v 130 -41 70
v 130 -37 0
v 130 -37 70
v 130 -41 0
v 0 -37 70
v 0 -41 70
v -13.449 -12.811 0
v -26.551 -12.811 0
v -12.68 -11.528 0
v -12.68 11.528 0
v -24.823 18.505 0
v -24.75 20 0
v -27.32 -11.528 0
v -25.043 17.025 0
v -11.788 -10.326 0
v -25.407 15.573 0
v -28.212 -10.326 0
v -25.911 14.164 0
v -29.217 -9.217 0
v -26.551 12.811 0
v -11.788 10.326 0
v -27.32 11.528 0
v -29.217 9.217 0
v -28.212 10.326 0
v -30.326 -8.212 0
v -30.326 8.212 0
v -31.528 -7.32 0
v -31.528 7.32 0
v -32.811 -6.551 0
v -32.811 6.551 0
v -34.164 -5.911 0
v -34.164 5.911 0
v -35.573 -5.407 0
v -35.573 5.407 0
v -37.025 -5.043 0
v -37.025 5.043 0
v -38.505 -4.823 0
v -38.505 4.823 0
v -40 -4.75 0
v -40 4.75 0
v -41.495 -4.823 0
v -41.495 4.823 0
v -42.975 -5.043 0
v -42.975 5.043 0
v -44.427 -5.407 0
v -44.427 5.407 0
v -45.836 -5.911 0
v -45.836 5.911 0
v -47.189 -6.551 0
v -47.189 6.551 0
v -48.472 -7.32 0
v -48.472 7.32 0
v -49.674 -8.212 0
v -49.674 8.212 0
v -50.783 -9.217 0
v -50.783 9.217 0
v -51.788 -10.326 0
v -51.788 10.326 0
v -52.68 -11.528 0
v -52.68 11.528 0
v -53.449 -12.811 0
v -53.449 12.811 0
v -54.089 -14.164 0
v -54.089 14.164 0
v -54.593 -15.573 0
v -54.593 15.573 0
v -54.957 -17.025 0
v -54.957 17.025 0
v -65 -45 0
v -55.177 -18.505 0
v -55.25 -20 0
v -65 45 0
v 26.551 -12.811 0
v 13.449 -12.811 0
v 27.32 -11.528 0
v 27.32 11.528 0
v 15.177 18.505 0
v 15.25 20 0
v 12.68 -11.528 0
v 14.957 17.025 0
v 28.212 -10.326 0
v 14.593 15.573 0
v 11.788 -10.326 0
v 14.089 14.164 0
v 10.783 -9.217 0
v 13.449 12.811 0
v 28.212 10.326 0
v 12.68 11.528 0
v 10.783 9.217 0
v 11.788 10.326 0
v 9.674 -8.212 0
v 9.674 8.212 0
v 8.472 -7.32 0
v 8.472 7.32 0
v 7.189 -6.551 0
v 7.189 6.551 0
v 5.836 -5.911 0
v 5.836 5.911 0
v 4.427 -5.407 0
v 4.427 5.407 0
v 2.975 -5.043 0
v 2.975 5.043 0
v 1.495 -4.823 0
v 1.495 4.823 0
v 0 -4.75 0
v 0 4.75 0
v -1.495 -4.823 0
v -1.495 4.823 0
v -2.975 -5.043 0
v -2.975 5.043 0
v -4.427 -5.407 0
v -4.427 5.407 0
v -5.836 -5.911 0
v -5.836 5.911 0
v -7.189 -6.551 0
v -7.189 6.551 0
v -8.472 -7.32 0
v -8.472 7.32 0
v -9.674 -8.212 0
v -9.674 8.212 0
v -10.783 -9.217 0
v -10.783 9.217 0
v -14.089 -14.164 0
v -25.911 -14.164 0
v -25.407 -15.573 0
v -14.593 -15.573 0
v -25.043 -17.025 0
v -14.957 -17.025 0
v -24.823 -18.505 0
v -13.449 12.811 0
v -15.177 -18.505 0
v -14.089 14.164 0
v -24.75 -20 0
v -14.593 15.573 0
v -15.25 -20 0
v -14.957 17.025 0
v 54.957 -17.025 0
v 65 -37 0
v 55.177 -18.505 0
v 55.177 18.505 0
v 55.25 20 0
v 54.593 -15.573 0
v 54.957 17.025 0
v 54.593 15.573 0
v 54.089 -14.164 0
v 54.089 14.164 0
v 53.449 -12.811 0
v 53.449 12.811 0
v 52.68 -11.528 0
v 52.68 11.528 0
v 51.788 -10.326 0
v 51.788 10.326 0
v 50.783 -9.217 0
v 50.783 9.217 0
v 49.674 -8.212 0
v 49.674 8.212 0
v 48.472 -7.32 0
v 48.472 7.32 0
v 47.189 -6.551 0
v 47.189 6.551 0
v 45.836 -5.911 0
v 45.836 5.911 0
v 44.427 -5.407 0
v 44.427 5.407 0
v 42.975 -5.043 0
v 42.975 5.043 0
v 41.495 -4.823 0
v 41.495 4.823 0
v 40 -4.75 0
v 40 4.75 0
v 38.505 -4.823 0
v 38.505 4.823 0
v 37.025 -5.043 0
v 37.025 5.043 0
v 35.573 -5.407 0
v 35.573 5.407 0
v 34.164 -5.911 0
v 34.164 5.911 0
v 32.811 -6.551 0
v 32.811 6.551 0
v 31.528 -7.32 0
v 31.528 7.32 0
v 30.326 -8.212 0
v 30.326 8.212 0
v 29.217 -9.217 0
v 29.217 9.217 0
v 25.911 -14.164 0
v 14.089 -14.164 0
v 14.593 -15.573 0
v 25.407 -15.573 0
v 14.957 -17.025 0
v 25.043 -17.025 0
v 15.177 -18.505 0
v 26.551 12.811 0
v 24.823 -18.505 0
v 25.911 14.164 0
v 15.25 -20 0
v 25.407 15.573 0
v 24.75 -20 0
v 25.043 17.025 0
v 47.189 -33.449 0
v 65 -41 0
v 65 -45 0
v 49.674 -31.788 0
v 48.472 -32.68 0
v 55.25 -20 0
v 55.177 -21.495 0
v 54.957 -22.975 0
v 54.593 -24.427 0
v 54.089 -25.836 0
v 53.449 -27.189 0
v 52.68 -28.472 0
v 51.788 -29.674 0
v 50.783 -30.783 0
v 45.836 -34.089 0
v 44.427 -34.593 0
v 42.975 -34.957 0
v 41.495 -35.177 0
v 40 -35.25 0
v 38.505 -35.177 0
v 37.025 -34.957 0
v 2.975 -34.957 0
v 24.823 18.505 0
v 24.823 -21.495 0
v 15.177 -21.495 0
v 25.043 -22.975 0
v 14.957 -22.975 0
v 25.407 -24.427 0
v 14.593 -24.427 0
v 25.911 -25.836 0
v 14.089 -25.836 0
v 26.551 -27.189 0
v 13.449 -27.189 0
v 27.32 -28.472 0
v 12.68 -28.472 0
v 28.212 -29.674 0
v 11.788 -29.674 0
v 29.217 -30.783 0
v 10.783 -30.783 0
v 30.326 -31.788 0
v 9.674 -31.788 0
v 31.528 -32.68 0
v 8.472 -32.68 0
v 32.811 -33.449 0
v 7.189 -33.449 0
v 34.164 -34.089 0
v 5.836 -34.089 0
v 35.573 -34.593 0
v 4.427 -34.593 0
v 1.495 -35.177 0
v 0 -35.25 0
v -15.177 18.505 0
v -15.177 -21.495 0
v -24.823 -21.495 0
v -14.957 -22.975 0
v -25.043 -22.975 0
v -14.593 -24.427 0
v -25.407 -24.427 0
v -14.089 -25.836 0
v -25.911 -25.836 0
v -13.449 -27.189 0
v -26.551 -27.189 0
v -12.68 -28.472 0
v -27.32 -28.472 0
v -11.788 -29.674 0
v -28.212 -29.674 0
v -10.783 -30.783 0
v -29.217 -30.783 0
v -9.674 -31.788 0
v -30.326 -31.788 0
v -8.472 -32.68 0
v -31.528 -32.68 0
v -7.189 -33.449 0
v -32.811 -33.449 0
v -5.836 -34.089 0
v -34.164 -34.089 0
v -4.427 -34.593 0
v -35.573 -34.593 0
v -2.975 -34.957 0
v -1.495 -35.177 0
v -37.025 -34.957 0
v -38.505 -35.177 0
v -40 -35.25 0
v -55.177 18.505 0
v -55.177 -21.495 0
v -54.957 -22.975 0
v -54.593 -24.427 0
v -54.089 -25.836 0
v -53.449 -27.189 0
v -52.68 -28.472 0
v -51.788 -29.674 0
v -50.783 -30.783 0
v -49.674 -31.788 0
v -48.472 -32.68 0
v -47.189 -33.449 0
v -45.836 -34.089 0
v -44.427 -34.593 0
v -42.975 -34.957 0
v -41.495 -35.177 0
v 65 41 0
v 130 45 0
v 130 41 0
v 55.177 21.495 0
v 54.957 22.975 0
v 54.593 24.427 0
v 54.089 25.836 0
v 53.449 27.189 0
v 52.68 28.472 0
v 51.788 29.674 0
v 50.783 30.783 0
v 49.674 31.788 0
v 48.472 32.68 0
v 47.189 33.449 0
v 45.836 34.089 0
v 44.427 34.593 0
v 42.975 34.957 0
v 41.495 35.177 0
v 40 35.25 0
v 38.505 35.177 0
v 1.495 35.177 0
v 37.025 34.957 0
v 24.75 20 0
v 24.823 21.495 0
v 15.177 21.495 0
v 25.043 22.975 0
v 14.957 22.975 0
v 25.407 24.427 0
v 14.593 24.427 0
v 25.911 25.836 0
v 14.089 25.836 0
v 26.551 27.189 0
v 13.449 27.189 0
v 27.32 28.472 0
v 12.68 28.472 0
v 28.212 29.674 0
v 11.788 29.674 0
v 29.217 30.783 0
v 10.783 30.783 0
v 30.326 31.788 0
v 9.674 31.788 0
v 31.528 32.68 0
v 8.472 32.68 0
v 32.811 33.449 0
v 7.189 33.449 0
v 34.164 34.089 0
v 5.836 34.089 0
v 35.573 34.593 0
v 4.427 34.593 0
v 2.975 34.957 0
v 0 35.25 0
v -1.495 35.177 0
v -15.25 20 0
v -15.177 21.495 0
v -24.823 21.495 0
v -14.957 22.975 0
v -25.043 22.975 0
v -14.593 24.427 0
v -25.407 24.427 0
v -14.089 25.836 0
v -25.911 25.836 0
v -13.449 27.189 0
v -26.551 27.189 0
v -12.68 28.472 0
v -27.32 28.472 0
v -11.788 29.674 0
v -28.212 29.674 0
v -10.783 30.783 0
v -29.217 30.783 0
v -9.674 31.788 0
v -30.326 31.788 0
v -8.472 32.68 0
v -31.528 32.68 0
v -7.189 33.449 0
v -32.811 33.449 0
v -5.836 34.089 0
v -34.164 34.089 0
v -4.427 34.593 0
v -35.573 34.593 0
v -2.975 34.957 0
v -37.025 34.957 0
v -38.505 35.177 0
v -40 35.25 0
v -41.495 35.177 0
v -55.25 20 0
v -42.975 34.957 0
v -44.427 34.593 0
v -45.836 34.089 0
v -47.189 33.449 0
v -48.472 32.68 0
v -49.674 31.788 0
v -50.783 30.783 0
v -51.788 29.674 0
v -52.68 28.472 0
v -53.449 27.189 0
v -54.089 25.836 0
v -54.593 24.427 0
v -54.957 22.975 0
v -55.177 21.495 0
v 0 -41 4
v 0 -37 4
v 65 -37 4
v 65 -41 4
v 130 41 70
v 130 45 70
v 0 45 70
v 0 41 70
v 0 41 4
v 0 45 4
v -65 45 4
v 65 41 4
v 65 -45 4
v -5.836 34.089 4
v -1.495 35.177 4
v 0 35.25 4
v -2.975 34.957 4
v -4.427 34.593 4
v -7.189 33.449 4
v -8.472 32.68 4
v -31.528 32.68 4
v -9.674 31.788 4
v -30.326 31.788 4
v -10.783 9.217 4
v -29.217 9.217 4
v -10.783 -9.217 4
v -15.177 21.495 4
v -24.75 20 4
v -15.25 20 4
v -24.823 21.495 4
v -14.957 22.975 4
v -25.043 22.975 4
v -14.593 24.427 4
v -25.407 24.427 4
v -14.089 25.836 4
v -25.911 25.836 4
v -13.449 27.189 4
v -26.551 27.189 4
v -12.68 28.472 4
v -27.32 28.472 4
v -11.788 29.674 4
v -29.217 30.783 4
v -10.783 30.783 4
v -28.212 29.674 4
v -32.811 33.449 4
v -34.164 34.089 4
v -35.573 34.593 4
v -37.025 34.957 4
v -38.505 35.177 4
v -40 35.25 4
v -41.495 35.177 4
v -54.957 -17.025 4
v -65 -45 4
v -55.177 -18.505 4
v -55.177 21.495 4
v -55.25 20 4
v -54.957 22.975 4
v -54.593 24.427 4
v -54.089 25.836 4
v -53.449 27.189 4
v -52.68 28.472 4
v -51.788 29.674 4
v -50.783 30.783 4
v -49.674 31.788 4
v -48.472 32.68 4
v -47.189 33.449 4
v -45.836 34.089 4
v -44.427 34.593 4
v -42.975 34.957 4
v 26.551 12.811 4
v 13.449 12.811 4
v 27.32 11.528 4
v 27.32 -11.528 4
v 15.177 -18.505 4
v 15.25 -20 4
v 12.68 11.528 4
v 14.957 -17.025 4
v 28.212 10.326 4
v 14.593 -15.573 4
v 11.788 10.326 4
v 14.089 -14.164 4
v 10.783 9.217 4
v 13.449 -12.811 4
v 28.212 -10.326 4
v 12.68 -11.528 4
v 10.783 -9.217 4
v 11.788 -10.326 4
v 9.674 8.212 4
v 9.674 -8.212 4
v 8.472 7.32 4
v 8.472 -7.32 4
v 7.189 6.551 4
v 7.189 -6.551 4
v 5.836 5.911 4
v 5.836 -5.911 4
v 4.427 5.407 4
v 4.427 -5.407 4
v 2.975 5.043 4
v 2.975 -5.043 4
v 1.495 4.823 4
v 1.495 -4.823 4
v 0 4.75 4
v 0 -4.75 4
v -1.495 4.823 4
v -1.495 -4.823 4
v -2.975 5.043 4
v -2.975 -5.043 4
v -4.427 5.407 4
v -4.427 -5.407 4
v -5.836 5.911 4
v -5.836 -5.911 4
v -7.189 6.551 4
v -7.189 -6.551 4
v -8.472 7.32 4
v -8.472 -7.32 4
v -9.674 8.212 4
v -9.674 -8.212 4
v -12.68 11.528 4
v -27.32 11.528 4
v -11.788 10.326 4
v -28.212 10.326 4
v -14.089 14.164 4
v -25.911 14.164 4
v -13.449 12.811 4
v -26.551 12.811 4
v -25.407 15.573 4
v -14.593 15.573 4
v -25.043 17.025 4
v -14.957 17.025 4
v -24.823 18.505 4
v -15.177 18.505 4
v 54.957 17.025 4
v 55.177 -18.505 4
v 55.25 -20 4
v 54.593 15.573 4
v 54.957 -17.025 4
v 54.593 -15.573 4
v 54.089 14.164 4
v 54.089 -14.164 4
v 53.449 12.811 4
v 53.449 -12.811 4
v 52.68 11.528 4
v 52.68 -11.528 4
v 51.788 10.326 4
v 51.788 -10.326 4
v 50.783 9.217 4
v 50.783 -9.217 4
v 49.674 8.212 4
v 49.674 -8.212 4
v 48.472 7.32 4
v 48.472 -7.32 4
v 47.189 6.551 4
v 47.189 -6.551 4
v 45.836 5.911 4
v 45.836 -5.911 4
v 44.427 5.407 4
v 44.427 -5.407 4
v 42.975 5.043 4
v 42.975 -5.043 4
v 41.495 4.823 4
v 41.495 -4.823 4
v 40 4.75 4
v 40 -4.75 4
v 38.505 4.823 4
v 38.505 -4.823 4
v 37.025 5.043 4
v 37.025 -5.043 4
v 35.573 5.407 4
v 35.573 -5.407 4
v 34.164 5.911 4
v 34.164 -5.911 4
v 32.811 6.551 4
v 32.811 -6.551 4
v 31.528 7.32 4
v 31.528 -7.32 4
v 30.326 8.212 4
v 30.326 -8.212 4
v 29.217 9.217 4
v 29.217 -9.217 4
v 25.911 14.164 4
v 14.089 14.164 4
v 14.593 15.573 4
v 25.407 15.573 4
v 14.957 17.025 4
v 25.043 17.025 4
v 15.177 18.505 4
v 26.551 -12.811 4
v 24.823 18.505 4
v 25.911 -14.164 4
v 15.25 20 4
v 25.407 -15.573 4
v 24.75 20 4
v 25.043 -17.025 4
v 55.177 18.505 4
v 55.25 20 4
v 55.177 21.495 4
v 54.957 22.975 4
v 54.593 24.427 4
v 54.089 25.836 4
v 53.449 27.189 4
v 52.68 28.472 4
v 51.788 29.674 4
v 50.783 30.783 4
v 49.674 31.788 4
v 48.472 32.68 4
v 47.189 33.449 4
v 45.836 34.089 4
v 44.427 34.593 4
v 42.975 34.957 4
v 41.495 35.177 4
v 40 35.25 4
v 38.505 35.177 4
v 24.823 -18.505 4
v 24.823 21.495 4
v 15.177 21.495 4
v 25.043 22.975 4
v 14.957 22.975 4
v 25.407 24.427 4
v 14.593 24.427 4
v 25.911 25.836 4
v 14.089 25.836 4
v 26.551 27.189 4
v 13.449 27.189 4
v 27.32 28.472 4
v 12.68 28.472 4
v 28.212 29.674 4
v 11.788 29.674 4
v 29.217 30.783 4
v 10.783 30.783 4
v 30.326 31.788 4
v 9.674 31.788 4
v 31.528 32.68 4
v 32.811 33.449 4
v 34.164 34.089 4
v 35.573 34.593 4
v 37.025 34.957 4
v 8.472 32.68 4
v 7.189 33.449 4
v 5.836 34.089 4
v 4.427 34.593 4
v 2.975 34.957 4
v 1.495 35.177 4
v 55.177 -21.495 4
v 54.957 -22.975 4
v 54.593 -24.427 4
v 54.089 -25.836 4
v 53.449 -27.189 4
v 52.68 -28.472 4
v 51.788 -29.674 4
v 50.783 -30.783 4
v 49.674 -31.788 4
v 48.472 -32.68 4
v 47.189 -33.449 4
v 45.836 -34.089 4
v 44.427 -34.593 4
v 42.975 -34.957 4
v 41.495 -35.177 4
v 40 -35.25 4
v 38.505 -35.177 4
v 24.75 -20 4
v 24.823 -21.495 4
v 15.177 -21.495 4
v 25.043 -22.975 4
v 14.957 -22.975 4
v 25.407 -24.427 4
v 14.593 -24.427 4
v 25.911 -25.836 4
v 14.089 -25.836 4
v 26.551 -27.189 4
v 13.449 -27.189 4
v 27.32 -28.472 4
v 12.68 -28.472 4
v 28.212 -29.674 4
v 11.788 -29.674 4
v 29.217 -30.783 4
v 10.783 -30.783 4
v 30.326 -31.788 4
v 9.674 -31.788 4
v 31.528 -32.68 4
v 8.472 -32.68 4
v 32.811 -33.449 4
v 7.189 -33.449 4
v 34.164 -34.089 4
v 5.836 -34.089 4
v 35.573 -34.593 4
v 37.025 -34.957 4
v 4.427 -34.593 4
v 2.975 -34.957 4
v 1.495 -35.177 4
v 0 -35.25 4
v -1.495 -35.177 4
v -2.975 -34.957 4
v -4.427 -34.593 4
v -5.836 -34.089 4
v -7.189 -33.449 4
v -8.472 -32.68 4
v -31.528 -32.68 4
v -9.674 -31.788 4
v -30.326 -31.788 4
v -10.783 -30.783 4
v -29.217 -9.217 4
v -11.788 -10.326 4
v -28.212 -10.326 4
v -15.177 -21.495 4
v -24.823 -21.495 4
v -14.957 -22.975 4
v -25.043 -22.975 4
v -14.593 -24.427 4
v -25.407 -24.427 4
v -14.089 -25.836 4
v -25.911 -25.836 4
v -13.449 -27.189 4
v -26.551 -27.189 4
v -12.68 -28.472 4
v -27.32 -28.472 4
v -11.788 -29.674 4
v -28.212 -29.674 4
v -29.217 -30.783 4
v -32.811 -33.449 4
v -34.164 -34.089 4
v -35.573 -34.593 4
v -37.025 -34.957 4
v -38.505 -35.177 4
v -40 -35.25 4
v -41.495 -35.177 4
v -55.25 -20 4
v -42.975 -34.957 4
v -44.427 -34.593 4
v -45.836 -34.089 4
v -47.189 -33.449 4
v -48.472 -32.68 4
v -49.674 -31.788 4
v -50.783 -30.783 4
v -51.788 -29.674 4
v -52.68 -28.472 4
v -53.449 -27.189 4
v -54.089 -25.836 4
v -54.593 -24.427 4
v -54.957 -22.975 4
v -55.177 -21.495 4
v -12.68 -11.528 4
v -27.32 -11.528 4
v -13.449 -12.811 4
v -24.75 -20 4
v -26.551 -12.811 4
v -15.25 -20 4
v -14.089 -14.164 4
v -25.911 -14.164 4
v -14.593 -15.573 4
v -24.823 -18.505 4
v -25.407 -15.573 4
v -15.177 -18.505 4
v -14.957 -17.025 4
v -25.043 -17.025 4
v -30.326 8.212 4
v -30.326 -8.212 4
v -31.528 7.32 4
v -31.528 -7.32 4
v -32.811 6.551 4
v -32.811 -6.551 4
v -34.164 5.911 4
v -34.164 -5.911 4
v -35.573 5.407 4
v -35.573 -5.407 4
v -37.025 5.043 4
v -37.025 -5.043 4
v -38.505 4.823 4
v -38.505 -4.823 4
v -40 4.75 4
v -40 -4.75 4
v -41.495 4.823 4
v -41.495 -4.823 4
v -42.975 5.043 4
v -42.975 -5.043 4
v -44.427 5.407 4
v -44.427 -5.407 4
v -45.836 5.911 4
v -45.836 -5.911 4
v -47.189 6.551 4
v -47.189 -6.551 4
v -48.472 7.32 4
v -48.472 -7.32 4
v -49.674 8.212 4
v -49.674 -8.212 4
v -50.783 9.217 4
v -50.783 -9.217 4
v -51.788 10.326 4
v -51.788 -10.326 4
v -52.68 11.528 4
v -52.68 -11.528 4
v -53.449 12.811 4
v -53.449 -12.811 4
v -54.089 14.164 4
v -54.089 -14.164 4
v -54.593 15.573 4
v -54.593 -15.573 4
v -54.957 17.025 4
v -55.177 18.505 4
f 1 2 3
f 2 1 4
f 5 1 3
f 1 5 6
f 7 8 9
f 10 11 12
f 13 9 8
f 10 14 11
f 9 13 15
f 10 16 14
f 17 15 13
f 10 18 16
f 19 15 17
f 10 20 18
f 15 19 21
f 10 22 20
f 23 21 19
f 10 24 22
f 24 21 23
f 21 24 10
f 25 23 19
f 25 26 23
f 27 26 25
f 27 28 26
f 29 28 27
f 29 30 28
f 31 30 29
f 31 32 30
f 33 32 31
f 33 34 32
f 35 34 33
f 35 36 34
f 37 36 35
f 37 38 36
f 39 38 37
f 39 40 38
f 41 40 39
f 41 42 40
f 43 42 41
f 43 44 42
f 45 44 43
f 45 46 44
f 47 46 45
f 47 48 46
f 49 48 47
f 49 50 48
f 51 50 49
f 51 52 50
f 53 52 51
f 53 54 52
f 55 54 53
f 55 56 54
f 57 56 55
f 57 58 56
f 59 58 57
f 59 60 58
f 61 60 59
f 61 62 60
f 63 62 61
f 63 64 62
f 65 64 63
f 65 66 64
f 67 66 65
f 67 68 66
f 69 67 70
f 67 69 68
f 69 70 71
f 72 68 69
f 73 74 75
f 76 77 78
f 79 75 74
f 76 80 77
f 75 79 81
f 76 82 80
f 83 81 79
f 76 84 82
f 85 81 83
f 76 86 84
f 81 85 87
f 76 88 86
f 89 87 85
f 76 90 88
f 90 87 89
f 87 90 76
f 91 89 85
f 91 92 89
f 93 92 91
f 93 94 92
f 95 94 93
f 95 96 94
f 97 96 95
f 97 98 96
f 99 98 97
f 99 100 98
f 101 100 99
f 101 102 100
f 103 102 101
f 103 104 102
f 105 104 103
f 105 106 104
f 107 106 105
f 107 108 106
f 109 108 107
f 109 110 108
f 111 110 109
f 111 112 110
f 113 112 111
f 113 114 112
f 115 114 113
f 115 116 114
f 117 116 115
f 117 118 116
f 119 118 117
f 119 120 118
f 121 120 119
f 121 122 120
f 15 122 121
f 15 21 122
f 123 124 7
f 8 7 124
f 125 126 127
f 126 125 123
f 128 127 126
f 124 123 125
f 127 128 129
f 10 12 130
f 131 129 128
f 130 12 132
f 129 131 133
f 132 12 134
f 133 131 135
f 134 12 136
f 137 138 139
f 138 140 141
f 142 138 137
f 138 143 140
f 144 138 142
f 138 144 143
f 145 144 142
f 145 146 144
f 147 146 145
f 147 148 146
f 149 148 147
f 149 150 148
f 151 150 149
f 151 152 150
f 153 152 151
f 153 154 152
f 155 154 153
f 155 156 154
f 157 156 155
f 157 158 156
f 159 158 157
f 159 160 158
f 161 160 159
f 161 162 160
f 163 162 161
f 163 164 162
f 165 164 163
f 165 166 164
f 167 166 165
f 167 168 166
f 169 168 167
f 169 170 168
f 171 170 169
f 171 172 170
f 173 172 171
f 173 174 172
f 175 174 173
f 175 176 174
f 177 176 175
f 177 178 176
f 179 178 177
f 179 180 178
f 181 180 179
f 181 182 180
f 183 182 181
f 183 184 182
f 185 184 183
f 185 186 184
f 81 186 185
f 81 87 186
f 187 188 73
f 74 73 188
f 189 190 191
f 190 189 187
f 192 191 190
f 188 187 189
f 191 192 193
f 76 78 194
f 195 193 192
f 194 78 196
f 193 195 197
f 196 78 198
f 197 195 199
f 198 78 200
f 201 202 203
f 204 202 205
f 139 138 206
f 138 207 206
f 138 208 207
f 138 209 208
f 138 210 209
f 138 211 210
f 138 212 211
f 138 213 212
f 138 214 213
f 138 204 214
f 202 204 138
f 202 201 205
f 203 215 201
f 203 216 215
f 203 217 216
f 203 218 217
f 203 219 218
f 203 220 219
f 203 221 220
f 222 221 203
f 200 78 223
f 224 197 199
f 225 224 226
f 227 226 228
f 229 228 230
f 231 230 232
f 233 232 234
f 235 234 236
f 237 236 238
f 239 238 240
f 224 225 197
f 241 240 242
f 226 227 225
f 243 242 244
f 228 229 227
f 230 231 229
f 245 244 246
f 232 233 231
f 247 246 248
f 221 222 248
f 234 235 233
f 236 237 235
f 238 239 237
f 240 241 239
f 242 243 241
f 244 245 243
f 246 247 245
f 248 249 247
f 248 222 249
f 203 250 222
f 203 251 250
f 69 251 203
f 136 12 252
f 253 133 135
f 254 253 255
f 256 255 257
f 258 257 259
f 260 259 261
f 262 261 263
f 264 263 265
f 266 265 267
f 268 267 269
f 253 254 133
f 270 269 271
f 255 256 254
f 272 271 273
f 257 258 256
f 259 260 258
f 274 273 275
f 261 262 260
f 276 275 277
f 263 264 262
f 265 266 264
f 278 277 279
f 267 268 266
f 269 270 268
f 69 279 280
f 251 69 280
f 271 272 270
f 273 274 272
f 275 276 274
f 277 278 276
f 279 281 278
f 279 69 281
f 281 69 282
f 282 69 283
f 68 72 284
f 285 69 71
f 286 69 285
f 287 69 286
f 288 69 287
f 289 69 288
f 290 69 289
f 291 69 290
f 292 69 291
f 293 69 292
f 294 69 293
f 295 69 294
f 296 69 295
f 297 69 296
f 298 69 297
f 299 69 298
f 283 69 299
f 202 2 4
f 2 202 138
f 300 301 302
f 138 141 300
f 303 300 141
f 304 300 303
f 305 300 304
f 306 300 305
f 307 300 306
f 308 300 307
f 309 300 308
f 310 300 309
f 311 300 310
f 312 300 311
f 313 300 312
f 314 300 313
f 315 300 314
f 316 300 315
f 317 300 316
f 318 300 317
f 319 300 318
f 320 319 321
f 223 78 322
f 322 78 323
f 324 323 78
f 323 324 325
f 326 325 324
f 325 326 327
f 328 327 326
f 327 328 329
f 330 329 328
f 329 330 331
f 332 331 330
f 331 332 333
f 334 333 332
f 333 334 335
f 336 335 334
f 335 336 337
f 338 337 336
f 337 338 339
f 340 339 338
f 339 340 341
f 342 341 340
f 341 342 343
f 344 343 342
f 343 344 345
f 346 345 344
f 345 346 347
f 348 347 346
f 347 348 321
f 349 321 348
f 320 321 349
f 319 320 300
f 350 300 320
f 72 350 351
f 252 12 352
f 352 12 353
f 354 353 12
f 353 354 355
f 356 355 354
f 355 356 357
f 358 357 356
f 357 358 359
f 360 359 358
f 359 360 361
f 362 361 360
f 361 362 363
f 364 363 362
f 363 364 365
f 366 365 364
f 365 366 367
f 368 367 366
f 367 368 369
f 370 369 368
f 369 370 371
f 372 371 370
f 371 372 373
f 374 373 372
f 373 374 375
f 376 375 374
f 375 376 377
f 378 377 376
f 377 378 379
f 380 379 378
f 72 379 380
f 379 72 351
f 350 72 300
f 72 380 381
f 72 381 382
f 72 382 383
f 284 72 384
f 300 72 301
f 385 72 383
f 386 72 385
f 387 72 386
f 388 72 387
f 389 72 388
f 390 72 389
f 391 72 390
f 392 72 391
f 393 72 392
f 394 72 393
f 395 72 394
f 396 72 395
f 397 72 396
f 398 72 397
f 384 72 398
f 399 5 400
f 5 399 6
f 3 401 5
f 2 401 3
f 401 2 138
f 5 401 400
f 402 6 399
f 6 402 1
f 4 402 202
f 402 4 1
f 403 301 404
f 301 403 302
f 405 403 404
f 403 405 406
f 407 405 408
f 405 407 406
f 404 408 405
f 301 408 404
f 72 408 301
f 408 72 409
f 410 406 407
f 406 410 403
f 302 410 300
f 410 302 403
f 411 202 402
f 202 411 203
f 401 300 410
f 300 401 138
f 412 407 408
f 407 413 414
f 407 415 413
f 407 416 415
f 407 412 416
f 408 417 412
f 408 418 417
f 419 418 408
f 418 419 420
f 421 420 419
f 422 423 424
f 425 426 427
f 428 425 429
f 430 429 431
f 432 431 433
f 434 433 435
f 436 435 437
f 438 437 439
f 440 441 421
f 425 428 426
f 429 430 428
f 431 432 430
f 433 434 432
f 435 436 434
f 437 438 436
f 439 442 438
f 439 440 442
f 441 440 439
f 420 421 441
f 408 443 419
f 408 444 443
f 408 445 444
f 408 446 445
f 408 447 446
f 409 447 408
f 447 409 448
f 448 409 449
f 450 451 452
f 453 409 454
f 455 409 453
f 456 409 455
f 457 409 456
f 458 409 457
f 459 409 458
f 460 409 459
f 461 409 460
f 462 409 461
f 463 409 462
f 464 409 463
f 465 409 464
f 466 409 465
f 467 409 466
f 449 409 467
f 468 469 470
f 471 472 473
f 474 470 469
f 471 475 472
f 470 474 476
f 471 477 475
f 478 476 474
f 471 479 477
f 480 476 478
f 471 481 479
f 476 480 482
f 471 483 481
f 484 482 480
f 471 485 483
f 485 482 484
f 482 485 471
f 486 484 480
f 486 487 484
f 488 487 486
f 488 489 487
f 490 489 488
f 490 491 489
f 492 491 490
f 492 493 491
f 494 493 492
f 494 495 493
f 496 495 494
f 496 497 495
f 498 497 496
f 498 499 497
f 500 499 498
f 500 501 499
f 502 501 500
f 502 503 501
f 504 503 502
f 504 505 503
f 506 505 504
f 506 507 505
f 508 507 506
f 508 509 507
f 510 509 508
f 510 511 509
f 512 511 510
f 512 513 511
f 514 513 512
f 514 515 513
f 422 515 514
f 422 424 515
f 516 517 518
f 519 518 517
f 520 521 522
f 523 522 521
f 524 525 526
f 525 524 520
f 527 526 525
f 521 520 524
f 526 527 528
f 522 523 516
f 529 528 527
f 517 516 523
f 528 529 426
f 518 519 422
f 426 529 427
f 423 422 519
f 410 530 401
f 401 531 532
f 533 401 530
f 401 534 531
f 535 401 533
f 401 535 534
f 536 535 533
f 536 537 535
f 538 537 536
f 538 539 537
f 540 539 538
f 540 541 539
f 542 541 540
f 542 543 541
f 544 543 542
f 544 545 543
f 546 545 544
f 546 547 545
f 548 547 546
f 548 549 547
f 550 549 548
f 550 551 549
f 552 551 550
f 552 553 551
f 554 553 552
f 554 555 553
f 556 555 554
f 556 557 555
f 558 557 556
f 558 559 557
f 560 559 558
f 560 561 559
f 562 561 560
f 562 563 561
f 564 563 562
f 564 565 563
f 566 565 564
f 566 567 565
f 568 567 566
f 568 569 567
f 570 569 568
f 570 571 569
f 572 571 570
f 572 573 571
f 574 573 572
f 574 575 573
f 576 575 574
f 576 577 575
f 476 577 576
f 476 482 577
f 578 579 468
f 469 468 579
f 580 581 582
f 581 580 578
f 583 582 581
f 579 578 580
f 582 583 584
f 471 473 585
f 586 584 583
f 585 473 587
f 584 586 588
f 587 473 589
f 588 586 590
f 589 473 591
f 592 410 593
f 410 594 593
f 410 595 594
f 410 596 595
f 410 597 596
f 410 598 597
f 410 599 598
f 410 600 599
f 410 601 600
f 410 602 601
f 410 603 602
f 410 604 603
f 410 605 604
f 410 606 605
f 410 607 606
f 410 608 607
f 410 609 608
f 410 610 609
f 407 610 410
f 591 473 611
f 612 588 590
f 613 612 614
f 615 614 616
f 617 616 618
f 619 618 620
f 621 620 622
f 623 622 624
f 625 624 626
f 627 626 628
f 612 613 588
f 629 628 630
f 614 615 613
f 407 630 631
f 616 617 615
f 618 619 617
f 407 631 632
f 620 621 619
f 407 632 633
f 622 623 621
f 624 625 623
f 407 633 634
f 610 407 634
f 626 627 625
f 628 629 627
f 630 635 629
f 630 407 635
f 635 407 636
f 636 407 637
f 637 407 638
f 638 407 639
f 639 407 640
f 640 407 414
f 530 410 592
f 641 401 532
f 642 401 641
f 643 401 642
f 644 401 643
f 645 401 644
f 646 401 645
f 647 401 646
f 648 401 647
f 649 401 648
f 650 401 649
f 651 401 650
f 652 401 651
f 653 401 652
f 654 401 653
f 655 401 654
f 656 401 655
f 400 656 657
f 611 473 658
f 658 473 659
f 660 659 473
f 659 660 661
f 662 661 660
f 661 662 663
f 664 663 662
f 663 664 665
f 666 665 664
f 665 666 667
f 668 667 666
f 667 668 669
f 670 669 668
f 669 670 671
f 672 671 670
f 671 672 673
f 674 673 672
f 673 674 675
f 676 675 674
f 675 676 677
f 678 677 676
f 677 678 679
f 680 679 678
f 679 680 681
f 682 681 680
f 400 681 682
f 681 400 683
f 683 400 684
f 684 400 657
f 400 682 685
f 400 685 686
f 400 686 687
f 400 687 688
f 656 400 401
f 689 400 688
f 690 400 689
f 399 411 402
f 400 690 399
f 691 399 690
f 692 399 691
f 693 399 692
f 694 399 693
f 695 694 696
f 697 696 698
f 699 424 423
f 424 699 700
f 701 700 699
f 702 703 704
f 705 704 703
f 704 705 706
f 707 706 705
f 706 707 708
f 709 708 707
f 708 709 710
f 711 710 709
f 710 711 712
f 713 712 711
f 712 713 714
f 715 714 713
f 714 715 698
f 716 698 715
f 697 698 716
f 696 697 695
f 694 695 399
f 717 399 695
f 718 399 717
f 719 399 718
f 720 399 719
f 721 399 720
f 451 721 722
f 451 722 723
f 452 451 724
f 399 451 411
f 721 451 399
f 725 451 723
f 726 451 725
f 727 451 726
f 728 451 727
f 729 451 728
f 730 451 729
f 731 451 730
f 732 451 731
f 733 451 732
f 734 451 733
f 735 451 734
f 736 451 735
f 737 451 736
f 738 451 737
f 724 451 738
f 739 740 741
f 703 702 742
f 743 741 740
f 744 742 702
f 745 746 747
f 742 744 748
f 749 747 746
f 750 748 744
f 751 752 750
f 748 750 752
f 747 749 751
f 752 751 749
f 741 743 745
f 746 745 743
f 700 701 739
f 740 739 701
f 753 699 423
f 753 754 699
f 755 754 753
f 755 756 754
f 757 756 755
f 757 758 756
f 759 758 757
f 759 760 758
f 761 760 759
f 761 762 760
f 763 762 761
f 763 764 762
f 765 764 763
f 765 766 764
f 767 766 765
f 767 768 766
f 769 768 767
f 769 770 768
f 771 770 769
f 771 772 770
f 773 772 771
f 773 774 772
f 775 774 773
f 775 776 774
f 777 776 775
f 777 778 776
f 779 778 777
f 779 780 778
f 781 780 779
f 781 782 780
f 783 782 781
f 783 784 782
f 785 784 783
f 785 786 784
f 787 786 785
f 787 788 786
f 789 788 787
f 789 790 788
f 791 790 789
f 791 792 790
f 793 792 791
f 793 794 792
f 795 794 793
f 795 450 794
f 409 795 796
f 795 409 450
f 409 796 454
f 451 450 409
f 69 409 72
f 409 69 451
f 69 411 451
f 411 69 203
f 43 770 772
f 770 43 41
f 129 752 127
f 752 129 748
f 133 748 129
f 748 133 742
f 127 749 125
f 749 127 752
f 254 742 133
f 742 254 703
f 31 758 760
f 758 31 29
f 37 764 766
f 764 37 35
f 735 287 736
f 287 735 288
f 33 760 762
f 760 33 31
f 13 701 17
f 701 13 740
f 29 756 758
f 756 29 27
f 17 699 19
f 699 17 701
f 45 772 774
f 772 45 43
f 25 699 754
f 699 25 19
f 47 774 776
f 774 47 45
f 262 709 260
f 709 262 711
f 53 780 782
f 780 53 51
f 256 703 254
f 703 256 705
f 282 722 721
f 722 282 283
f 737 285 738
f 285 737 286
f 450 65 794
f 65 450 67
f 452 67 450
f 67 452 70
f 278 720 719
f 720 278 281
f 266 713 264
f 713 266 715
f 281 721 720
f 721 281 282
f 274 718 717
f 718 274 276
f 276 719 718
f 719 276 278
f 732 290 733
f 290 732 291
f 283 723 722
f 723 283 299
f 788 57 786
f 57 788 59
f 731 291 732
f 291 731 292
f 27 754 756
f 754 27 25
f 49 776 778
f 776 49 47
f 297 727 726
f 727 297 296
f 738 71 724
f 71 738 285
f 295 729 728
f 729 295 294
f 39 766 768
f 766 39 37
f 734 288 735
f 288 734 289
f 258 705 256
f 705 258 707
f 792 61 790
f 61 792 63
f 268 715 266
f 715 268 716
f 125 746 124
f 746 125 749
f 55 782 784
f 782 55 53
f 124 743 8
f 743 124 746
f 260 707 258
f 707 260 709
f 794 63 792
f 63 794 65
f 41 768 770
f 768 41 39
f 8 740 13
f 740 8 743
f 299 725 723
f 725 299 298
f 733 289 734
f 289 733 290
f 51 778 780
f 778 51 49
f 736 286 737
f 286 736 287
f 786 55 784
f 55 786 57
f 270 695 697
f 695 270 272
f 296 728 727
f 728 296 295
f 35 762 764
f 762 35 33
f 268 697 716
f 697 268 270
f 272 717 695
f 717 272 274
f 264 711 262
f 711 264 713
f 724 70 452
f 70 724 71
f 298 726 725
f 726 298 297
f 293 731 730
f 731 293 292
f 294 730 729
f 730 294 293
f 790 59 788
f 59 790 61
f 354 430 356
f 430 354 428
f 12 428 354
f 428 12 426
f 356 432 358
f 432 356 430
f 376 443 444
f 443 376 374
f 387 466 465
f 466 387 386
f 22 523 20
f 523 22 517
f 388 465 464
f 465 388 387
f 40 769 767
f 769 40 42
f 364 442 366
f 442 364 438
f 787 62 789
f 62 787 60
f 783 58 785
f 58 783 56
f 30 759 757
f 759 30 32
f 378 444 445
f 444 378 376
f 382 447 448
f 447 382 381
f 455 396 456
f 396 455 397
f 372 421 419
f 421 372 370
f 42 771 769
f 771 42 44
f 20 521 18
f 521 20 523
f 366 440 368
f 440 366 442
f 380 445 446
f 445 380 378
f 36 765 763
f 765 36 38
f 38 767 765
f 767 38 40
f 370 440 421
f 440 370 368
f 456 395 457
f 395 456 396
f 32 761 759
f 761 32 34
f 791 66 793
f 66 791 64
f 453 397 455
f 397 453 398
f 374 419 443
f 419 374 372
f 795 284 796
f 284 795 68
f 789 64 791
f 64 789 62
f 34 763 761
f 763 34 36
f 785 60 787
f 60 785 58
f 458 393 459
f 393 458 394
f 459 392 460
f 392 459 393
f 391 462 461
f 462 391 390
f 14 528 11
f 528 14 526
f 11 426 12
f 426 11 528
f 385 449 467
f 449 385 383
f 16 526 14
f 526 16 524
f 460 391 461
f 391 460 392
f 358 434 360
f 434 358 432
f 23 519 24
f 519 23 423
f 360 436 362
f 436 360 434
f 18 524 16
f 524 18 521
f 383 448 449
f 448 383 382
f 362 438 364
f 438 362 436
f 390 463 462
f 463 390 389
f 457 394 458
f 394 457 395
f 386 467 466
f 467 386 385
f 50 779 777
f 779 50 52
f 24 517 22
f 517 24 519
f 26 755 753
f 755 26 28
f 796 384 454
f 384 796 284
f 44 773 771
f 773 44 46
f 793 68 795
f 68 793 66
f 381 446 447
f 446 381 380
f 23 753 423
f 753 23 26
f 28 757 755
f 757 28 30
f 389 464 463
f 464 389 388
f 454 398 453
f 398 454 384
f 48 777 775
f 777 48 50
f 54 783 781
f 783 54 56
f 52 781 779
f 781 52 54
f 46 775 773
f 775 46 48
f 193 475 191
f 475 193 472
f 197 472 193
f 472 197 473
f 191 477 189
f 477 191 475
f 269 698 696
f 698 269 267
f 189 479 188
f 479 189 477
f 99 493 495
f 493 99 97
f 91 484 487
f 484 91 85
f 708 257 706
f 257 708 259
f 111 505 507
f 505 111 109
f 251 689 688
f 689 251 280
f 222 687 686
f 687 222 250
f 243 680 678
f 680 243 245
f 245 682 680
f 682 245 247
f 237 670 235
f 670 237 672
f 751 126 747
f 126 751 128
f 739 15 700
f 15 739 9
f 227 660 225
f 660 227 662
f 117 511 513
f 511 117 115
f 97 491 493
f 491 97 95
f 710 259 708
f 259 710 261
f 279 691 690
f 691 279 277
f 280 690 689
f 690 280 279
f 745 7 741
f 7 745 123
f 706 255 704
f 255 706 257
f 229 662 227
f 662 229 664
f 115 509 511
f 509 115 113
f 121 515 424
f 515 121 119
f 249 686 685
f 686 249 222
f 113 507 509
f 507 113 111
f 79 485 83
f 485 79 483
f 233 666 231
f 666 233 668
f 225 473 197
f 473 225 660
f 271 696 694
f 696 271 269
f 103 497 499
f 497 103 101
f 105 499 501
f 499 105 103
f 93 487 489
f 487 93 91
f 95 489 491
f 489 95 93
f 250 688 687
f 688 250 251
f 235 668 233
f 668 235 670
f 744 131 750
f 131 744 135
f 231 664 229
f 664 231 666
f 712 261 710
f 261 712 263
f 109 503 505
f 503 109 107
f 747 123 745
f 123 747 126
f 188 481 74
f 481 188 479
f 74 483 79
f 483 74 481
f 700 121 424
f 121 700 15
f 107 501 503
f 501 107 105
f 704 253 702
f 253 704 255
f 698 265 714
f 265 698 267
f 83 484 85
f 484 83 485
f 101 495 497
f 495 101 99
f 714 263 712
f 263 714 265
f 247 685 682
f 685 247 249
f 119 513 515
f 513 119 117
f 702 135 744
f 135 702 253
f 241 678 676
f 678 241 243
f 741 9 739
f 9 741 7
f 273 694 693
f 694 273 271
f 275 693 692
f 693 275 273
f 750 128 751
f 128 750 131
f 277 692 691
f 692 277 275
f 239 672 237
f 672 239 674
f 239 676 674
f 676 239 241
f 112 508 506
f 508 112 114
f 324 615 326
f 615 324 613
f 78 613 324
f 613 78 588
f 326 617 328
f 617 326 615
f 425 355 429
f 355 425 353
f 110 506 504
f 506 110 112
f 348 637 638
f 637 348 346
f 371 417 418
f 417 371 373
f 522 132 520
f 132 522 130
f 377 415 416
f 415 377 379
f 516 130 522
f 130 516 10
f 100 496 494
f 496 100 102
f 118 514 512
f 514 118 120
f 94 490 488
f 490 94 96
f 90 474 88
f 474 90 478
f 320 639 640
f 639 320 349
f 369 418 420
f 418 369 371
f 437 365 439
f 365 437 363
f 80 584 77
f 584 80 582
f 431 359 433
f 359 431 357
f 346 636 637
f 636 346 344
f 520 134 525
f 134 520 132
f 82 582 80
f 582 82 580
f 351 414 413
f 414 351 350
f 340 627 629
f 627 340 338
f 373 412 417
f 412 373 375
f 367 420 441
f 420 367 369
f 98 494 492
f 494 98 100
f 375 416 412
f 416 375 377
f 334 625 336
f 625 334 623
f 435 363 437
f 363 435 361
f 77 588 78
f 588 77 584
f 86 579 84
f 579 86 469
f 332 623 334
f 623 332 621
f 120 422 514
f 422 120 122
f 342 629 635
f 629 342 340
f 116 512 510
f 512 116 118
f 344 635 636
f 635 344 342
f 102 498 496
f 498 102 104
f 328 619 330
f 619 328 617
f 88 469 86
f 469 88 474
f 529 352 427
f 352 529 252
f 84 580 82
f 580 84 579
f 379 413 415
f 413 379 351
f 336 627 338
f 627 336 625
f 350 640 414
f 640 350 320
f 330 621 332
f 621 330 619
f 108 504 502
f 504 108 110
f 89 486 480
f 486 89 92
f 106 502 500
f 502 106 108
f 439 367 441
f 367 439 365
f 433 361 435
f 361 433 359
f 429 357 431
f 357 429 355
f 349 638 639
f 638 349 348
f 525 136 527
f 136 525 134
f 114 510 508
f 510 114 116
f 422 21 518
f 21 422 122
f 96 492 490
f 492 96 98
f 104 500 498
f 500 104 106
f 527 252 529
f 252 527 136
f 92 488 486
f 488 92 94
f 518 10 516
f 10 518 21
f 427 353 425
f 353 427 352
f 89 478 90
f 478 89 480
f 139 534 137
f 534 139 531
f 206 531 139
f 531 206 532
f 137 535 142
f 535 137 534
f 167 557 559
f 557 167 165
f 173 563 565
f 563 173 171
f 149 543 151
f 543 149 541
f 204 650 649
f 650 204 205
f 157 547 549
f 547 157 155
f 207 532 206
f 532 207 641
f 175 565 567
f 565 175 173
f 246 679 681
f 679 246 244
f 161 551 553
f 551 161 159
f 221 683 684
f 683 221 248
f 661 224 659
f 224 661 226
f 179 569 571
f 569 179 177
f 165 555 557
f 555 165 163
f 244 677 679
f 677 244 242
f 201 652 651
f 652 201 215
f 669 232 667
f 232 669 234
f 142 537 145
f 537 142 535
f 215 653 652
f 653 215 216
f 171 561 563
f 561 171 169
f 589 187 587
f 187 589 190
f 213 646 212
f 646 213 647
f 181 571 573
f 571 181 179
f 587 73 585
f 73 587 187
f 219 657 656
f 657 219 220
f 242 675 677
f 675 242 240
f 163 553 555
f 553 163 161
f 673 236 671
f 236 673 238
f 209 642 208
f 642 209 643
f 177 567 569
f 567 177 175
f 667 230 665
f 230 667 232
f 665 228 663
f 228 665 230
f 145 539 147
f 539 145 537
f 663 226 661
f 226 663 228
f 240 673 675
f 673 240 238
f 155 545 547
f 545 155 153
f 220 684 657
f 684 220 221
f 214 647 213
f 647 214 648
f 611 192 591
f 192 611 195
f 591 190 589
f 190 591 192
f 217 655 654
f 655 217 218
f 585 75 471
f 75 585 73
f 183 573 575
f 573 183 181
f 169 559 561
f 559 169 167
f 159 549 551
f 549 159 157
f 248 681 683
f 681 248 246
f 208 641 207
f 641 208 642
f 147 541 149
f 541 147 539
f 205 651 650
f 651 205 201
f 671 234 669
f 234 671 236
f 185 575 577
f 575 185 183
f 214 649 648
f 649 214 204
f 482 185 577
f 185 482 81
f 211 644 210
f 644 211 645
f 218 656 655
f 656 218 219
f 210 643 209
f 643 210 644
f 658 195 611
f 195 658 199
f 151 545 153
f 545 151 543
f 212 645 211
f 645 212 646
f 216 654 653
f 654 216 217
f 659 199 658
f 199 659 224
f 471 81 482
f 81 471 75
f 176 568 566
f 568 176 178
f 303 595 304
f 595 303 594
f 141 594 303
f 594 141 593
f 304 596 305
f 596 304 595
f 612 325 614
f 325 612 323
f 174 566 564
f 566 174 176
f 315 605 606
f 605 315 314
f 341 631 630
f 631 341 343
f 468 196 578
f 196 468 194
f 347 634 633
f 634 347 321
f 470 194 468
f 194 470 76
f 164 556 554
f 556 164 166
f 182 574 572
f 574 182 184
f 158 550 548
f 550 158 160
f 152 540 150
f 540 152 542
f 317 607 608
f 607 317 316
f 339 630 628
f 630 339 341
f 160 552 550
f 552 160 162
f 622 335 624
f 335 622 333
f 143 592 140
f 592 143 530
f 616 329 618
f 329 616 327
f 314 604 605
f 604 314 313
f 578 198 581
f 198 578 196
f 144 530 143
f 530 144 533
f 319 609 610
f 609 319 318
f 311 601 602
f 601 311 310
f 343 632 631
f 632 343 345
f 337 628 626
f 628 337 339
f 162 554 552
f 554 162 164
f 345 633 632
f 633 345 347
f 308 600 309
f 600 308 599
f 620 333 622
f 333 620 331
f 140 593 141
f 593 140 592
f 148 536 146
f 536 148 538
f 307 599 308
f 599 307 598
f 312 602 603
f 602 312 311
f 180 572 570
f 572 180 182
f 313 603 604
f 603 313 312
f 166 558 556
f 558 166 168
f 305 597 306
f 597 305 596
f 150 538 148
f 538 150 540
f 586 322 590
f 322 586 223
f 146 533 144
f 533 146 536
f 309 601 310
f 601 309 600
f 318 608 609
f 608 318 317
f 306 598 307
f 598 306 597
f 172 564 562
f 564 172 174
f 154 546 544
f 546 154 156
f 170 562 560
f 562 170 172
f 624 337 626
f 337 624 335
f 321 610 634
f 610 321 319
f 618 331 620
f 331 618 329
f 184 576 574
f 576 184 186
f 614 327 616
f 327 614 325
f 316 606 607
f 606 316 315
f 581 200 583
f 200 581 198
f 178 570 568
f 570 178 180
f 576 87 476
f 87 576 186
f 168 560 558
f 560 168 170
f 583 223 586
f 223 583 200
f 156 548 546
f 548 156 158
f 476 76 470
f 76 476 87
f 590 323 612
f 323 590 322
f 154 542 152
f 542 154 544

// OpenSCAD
// Rack for six 50 mL conical (Falcon-type) tubes
// Print orientation: flat plate on bed, walls rising to z = 70.
// After printing, flip the part so the walls stand on the bed and the
// tube holes face upward.
//
// Units: mm. $fn = 64 for round holes.

// ---------------- Parameters ----------------
plate_x      = 130;   // plate length along X
plate_y      = 90;    // plate width along Y
plate_t      = 4;     // plate thickness (z = 0 to 4)

hole_d       = 30.5;  // through-hole diameter
hole_nx      = 3;     // holes per row along X
hole_ny      = 2;     // rows along Y
hole_pitch   = 40;    // centre-to-centre spacing (X and Y)

wall_len     = plate_x; // wall length along X (flush with plate edge)
wall_t       = 4;     // wall thickness along Y
wall_h       = 70;    // wall top height (z = 0 to 70)

eps          = 0.5;   // cutter overshoot past faces

$fn = 64;

// ---------------- Model ----------------
difference() {
    union() {
        // Base plate
        translate([-plate_x/2, -plate_y/2, 0])
            cube([plate_x, plate_y, plate_t]);

        // Two solid walls along the long edges
        for (s = [-1, 1])
            translate([0, s*(plate_y/2 - wall_t), 0])
                cube([wall_len, wall_t, wall_h]);
    }

    // Six through-holes, centred on the plate
    for (i = [0 : hole_nx - 1])
        for (j = [0 : hole_ny - 1])
            translate([(i - (hole_nx - 1)/2) * hole_pitch,
                       (j - (hole_ny - 1)/2) * hole_pitch,
                       -eps])
                cylinder(d = hole_d, h = plate_t + 2*eps);
}
